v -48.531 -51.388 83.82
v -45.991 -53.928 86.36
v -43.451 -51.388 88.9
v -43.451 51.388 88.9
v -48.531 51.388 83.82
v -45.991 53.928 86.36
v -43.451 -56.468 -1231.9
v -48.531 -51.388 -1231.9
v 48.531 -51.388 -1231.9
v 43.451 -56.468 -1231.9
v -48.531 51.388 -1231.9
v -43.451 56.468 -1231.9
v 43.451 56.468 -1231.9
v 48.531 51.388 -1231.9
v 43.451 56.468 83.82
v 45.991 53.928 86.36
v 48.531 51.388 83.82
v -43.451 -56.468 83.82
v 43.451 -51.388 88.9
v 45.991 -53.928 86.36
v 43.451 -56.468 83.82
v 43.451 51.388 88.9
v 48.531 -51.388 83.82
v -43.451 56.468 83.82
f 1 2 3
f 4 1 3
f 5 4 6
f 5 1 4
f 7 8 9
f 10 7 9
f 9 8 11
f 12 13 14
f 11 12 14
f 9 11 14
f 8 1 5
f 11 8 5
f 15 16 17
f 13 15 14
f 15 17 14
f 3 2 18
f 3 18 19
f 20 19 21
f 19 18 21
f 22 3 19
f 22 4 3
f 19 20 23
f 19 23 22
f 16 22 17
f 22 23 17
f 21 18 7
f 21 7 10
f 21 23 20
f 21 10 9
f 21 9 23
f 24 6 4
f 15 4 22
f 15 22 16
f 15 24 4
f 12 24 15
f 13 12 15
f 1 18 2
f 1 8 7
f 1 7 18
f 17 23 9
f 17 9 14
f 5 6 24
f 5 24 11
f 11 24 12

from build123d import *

# Parameters (mm, degrees)
F0_W          = 97.061902
F0_H          = 112.935424
F1_DEPTH      = 88.9
F1_DEPTH_BACK = 1231.9
F2_SIZE       = 5.08
F3_SIZE       = 5.08
F4_SIZE       = 5.08
F5_SIZE       = 5.08
F6_SIZE       = 5.08
F7_SIZE       = 5.08
F8_SIZE       = 5.08
F9_SIZE       = 5.08


with BuildPart() as f1:
    # F0 (on Top) → F1 (new body, two sides)
    with BuildSketch(Plane.XY) as f1_sk:
        Rectangle(F0_W, F0_H)
    extrude(amount=F1_DEPTH)
    extrude(f1_sk.sketch, amount=-F1_DEPTH_BACK)

    # F2
    f2_edges = [f1.edges().sort_by_distance(p)[0] for p in [
        (48.530951, -56.467712, -571.5),
    ]]
    chamfer(f2_edges, length=F2_SIZE)

    # F3
    f3_edges = [f1.edges().sort_by_distance(p)[0] for p in [
        (-48.530951, -56.467712, -571.5),
    ]]
    chamfer(f3_edges, length=F3_SIZE)

    # F4
    f4_edges = [f1.edges().sort_by_distance(p)[0] for p in [
        (-48.530951, 56.467712, -571.5),
    ]]
    chamfer(f4_edges, length=F4_SIZE)

    # F5
    f5_edges = [f1.edges().sort_by_distance(p)[0] for p in [
        (48.530951, 56.467712, -571.5),
    ]]
    chamfer(f5_edges, length=F5_SIZE)

    # F6
    f6_edges = [f1.edges().sort_by_distance(p)[0] for p in [
        (0, 56.467712, 88.9),
    ]]
    chamfer(f6_edges, length=F6_SIZE)

    # F7
    f7_edges = [f1.edges().sort_by_distance(p)[0] for p in [
        (48.530951, 0, 88.9),
    ]]
    chamfer(f7_edges, length=F7_SIZE)

    # F8
    f8_edges = [f1.edges().sort_by_distance(p)[0] for p in [
        (0, -56.467712, 88.9),
    ]]
    chamfer(f8_edges, length=F8_SIZE)

    # F9
    f9_edges = [f1.edges().sort_by_distance(p)[0] for p in [
        (-48.530951, 0, 88.9),
    ]]
    chamfer(f9_edges, length=F9_SIZE)


solid = f1.part
